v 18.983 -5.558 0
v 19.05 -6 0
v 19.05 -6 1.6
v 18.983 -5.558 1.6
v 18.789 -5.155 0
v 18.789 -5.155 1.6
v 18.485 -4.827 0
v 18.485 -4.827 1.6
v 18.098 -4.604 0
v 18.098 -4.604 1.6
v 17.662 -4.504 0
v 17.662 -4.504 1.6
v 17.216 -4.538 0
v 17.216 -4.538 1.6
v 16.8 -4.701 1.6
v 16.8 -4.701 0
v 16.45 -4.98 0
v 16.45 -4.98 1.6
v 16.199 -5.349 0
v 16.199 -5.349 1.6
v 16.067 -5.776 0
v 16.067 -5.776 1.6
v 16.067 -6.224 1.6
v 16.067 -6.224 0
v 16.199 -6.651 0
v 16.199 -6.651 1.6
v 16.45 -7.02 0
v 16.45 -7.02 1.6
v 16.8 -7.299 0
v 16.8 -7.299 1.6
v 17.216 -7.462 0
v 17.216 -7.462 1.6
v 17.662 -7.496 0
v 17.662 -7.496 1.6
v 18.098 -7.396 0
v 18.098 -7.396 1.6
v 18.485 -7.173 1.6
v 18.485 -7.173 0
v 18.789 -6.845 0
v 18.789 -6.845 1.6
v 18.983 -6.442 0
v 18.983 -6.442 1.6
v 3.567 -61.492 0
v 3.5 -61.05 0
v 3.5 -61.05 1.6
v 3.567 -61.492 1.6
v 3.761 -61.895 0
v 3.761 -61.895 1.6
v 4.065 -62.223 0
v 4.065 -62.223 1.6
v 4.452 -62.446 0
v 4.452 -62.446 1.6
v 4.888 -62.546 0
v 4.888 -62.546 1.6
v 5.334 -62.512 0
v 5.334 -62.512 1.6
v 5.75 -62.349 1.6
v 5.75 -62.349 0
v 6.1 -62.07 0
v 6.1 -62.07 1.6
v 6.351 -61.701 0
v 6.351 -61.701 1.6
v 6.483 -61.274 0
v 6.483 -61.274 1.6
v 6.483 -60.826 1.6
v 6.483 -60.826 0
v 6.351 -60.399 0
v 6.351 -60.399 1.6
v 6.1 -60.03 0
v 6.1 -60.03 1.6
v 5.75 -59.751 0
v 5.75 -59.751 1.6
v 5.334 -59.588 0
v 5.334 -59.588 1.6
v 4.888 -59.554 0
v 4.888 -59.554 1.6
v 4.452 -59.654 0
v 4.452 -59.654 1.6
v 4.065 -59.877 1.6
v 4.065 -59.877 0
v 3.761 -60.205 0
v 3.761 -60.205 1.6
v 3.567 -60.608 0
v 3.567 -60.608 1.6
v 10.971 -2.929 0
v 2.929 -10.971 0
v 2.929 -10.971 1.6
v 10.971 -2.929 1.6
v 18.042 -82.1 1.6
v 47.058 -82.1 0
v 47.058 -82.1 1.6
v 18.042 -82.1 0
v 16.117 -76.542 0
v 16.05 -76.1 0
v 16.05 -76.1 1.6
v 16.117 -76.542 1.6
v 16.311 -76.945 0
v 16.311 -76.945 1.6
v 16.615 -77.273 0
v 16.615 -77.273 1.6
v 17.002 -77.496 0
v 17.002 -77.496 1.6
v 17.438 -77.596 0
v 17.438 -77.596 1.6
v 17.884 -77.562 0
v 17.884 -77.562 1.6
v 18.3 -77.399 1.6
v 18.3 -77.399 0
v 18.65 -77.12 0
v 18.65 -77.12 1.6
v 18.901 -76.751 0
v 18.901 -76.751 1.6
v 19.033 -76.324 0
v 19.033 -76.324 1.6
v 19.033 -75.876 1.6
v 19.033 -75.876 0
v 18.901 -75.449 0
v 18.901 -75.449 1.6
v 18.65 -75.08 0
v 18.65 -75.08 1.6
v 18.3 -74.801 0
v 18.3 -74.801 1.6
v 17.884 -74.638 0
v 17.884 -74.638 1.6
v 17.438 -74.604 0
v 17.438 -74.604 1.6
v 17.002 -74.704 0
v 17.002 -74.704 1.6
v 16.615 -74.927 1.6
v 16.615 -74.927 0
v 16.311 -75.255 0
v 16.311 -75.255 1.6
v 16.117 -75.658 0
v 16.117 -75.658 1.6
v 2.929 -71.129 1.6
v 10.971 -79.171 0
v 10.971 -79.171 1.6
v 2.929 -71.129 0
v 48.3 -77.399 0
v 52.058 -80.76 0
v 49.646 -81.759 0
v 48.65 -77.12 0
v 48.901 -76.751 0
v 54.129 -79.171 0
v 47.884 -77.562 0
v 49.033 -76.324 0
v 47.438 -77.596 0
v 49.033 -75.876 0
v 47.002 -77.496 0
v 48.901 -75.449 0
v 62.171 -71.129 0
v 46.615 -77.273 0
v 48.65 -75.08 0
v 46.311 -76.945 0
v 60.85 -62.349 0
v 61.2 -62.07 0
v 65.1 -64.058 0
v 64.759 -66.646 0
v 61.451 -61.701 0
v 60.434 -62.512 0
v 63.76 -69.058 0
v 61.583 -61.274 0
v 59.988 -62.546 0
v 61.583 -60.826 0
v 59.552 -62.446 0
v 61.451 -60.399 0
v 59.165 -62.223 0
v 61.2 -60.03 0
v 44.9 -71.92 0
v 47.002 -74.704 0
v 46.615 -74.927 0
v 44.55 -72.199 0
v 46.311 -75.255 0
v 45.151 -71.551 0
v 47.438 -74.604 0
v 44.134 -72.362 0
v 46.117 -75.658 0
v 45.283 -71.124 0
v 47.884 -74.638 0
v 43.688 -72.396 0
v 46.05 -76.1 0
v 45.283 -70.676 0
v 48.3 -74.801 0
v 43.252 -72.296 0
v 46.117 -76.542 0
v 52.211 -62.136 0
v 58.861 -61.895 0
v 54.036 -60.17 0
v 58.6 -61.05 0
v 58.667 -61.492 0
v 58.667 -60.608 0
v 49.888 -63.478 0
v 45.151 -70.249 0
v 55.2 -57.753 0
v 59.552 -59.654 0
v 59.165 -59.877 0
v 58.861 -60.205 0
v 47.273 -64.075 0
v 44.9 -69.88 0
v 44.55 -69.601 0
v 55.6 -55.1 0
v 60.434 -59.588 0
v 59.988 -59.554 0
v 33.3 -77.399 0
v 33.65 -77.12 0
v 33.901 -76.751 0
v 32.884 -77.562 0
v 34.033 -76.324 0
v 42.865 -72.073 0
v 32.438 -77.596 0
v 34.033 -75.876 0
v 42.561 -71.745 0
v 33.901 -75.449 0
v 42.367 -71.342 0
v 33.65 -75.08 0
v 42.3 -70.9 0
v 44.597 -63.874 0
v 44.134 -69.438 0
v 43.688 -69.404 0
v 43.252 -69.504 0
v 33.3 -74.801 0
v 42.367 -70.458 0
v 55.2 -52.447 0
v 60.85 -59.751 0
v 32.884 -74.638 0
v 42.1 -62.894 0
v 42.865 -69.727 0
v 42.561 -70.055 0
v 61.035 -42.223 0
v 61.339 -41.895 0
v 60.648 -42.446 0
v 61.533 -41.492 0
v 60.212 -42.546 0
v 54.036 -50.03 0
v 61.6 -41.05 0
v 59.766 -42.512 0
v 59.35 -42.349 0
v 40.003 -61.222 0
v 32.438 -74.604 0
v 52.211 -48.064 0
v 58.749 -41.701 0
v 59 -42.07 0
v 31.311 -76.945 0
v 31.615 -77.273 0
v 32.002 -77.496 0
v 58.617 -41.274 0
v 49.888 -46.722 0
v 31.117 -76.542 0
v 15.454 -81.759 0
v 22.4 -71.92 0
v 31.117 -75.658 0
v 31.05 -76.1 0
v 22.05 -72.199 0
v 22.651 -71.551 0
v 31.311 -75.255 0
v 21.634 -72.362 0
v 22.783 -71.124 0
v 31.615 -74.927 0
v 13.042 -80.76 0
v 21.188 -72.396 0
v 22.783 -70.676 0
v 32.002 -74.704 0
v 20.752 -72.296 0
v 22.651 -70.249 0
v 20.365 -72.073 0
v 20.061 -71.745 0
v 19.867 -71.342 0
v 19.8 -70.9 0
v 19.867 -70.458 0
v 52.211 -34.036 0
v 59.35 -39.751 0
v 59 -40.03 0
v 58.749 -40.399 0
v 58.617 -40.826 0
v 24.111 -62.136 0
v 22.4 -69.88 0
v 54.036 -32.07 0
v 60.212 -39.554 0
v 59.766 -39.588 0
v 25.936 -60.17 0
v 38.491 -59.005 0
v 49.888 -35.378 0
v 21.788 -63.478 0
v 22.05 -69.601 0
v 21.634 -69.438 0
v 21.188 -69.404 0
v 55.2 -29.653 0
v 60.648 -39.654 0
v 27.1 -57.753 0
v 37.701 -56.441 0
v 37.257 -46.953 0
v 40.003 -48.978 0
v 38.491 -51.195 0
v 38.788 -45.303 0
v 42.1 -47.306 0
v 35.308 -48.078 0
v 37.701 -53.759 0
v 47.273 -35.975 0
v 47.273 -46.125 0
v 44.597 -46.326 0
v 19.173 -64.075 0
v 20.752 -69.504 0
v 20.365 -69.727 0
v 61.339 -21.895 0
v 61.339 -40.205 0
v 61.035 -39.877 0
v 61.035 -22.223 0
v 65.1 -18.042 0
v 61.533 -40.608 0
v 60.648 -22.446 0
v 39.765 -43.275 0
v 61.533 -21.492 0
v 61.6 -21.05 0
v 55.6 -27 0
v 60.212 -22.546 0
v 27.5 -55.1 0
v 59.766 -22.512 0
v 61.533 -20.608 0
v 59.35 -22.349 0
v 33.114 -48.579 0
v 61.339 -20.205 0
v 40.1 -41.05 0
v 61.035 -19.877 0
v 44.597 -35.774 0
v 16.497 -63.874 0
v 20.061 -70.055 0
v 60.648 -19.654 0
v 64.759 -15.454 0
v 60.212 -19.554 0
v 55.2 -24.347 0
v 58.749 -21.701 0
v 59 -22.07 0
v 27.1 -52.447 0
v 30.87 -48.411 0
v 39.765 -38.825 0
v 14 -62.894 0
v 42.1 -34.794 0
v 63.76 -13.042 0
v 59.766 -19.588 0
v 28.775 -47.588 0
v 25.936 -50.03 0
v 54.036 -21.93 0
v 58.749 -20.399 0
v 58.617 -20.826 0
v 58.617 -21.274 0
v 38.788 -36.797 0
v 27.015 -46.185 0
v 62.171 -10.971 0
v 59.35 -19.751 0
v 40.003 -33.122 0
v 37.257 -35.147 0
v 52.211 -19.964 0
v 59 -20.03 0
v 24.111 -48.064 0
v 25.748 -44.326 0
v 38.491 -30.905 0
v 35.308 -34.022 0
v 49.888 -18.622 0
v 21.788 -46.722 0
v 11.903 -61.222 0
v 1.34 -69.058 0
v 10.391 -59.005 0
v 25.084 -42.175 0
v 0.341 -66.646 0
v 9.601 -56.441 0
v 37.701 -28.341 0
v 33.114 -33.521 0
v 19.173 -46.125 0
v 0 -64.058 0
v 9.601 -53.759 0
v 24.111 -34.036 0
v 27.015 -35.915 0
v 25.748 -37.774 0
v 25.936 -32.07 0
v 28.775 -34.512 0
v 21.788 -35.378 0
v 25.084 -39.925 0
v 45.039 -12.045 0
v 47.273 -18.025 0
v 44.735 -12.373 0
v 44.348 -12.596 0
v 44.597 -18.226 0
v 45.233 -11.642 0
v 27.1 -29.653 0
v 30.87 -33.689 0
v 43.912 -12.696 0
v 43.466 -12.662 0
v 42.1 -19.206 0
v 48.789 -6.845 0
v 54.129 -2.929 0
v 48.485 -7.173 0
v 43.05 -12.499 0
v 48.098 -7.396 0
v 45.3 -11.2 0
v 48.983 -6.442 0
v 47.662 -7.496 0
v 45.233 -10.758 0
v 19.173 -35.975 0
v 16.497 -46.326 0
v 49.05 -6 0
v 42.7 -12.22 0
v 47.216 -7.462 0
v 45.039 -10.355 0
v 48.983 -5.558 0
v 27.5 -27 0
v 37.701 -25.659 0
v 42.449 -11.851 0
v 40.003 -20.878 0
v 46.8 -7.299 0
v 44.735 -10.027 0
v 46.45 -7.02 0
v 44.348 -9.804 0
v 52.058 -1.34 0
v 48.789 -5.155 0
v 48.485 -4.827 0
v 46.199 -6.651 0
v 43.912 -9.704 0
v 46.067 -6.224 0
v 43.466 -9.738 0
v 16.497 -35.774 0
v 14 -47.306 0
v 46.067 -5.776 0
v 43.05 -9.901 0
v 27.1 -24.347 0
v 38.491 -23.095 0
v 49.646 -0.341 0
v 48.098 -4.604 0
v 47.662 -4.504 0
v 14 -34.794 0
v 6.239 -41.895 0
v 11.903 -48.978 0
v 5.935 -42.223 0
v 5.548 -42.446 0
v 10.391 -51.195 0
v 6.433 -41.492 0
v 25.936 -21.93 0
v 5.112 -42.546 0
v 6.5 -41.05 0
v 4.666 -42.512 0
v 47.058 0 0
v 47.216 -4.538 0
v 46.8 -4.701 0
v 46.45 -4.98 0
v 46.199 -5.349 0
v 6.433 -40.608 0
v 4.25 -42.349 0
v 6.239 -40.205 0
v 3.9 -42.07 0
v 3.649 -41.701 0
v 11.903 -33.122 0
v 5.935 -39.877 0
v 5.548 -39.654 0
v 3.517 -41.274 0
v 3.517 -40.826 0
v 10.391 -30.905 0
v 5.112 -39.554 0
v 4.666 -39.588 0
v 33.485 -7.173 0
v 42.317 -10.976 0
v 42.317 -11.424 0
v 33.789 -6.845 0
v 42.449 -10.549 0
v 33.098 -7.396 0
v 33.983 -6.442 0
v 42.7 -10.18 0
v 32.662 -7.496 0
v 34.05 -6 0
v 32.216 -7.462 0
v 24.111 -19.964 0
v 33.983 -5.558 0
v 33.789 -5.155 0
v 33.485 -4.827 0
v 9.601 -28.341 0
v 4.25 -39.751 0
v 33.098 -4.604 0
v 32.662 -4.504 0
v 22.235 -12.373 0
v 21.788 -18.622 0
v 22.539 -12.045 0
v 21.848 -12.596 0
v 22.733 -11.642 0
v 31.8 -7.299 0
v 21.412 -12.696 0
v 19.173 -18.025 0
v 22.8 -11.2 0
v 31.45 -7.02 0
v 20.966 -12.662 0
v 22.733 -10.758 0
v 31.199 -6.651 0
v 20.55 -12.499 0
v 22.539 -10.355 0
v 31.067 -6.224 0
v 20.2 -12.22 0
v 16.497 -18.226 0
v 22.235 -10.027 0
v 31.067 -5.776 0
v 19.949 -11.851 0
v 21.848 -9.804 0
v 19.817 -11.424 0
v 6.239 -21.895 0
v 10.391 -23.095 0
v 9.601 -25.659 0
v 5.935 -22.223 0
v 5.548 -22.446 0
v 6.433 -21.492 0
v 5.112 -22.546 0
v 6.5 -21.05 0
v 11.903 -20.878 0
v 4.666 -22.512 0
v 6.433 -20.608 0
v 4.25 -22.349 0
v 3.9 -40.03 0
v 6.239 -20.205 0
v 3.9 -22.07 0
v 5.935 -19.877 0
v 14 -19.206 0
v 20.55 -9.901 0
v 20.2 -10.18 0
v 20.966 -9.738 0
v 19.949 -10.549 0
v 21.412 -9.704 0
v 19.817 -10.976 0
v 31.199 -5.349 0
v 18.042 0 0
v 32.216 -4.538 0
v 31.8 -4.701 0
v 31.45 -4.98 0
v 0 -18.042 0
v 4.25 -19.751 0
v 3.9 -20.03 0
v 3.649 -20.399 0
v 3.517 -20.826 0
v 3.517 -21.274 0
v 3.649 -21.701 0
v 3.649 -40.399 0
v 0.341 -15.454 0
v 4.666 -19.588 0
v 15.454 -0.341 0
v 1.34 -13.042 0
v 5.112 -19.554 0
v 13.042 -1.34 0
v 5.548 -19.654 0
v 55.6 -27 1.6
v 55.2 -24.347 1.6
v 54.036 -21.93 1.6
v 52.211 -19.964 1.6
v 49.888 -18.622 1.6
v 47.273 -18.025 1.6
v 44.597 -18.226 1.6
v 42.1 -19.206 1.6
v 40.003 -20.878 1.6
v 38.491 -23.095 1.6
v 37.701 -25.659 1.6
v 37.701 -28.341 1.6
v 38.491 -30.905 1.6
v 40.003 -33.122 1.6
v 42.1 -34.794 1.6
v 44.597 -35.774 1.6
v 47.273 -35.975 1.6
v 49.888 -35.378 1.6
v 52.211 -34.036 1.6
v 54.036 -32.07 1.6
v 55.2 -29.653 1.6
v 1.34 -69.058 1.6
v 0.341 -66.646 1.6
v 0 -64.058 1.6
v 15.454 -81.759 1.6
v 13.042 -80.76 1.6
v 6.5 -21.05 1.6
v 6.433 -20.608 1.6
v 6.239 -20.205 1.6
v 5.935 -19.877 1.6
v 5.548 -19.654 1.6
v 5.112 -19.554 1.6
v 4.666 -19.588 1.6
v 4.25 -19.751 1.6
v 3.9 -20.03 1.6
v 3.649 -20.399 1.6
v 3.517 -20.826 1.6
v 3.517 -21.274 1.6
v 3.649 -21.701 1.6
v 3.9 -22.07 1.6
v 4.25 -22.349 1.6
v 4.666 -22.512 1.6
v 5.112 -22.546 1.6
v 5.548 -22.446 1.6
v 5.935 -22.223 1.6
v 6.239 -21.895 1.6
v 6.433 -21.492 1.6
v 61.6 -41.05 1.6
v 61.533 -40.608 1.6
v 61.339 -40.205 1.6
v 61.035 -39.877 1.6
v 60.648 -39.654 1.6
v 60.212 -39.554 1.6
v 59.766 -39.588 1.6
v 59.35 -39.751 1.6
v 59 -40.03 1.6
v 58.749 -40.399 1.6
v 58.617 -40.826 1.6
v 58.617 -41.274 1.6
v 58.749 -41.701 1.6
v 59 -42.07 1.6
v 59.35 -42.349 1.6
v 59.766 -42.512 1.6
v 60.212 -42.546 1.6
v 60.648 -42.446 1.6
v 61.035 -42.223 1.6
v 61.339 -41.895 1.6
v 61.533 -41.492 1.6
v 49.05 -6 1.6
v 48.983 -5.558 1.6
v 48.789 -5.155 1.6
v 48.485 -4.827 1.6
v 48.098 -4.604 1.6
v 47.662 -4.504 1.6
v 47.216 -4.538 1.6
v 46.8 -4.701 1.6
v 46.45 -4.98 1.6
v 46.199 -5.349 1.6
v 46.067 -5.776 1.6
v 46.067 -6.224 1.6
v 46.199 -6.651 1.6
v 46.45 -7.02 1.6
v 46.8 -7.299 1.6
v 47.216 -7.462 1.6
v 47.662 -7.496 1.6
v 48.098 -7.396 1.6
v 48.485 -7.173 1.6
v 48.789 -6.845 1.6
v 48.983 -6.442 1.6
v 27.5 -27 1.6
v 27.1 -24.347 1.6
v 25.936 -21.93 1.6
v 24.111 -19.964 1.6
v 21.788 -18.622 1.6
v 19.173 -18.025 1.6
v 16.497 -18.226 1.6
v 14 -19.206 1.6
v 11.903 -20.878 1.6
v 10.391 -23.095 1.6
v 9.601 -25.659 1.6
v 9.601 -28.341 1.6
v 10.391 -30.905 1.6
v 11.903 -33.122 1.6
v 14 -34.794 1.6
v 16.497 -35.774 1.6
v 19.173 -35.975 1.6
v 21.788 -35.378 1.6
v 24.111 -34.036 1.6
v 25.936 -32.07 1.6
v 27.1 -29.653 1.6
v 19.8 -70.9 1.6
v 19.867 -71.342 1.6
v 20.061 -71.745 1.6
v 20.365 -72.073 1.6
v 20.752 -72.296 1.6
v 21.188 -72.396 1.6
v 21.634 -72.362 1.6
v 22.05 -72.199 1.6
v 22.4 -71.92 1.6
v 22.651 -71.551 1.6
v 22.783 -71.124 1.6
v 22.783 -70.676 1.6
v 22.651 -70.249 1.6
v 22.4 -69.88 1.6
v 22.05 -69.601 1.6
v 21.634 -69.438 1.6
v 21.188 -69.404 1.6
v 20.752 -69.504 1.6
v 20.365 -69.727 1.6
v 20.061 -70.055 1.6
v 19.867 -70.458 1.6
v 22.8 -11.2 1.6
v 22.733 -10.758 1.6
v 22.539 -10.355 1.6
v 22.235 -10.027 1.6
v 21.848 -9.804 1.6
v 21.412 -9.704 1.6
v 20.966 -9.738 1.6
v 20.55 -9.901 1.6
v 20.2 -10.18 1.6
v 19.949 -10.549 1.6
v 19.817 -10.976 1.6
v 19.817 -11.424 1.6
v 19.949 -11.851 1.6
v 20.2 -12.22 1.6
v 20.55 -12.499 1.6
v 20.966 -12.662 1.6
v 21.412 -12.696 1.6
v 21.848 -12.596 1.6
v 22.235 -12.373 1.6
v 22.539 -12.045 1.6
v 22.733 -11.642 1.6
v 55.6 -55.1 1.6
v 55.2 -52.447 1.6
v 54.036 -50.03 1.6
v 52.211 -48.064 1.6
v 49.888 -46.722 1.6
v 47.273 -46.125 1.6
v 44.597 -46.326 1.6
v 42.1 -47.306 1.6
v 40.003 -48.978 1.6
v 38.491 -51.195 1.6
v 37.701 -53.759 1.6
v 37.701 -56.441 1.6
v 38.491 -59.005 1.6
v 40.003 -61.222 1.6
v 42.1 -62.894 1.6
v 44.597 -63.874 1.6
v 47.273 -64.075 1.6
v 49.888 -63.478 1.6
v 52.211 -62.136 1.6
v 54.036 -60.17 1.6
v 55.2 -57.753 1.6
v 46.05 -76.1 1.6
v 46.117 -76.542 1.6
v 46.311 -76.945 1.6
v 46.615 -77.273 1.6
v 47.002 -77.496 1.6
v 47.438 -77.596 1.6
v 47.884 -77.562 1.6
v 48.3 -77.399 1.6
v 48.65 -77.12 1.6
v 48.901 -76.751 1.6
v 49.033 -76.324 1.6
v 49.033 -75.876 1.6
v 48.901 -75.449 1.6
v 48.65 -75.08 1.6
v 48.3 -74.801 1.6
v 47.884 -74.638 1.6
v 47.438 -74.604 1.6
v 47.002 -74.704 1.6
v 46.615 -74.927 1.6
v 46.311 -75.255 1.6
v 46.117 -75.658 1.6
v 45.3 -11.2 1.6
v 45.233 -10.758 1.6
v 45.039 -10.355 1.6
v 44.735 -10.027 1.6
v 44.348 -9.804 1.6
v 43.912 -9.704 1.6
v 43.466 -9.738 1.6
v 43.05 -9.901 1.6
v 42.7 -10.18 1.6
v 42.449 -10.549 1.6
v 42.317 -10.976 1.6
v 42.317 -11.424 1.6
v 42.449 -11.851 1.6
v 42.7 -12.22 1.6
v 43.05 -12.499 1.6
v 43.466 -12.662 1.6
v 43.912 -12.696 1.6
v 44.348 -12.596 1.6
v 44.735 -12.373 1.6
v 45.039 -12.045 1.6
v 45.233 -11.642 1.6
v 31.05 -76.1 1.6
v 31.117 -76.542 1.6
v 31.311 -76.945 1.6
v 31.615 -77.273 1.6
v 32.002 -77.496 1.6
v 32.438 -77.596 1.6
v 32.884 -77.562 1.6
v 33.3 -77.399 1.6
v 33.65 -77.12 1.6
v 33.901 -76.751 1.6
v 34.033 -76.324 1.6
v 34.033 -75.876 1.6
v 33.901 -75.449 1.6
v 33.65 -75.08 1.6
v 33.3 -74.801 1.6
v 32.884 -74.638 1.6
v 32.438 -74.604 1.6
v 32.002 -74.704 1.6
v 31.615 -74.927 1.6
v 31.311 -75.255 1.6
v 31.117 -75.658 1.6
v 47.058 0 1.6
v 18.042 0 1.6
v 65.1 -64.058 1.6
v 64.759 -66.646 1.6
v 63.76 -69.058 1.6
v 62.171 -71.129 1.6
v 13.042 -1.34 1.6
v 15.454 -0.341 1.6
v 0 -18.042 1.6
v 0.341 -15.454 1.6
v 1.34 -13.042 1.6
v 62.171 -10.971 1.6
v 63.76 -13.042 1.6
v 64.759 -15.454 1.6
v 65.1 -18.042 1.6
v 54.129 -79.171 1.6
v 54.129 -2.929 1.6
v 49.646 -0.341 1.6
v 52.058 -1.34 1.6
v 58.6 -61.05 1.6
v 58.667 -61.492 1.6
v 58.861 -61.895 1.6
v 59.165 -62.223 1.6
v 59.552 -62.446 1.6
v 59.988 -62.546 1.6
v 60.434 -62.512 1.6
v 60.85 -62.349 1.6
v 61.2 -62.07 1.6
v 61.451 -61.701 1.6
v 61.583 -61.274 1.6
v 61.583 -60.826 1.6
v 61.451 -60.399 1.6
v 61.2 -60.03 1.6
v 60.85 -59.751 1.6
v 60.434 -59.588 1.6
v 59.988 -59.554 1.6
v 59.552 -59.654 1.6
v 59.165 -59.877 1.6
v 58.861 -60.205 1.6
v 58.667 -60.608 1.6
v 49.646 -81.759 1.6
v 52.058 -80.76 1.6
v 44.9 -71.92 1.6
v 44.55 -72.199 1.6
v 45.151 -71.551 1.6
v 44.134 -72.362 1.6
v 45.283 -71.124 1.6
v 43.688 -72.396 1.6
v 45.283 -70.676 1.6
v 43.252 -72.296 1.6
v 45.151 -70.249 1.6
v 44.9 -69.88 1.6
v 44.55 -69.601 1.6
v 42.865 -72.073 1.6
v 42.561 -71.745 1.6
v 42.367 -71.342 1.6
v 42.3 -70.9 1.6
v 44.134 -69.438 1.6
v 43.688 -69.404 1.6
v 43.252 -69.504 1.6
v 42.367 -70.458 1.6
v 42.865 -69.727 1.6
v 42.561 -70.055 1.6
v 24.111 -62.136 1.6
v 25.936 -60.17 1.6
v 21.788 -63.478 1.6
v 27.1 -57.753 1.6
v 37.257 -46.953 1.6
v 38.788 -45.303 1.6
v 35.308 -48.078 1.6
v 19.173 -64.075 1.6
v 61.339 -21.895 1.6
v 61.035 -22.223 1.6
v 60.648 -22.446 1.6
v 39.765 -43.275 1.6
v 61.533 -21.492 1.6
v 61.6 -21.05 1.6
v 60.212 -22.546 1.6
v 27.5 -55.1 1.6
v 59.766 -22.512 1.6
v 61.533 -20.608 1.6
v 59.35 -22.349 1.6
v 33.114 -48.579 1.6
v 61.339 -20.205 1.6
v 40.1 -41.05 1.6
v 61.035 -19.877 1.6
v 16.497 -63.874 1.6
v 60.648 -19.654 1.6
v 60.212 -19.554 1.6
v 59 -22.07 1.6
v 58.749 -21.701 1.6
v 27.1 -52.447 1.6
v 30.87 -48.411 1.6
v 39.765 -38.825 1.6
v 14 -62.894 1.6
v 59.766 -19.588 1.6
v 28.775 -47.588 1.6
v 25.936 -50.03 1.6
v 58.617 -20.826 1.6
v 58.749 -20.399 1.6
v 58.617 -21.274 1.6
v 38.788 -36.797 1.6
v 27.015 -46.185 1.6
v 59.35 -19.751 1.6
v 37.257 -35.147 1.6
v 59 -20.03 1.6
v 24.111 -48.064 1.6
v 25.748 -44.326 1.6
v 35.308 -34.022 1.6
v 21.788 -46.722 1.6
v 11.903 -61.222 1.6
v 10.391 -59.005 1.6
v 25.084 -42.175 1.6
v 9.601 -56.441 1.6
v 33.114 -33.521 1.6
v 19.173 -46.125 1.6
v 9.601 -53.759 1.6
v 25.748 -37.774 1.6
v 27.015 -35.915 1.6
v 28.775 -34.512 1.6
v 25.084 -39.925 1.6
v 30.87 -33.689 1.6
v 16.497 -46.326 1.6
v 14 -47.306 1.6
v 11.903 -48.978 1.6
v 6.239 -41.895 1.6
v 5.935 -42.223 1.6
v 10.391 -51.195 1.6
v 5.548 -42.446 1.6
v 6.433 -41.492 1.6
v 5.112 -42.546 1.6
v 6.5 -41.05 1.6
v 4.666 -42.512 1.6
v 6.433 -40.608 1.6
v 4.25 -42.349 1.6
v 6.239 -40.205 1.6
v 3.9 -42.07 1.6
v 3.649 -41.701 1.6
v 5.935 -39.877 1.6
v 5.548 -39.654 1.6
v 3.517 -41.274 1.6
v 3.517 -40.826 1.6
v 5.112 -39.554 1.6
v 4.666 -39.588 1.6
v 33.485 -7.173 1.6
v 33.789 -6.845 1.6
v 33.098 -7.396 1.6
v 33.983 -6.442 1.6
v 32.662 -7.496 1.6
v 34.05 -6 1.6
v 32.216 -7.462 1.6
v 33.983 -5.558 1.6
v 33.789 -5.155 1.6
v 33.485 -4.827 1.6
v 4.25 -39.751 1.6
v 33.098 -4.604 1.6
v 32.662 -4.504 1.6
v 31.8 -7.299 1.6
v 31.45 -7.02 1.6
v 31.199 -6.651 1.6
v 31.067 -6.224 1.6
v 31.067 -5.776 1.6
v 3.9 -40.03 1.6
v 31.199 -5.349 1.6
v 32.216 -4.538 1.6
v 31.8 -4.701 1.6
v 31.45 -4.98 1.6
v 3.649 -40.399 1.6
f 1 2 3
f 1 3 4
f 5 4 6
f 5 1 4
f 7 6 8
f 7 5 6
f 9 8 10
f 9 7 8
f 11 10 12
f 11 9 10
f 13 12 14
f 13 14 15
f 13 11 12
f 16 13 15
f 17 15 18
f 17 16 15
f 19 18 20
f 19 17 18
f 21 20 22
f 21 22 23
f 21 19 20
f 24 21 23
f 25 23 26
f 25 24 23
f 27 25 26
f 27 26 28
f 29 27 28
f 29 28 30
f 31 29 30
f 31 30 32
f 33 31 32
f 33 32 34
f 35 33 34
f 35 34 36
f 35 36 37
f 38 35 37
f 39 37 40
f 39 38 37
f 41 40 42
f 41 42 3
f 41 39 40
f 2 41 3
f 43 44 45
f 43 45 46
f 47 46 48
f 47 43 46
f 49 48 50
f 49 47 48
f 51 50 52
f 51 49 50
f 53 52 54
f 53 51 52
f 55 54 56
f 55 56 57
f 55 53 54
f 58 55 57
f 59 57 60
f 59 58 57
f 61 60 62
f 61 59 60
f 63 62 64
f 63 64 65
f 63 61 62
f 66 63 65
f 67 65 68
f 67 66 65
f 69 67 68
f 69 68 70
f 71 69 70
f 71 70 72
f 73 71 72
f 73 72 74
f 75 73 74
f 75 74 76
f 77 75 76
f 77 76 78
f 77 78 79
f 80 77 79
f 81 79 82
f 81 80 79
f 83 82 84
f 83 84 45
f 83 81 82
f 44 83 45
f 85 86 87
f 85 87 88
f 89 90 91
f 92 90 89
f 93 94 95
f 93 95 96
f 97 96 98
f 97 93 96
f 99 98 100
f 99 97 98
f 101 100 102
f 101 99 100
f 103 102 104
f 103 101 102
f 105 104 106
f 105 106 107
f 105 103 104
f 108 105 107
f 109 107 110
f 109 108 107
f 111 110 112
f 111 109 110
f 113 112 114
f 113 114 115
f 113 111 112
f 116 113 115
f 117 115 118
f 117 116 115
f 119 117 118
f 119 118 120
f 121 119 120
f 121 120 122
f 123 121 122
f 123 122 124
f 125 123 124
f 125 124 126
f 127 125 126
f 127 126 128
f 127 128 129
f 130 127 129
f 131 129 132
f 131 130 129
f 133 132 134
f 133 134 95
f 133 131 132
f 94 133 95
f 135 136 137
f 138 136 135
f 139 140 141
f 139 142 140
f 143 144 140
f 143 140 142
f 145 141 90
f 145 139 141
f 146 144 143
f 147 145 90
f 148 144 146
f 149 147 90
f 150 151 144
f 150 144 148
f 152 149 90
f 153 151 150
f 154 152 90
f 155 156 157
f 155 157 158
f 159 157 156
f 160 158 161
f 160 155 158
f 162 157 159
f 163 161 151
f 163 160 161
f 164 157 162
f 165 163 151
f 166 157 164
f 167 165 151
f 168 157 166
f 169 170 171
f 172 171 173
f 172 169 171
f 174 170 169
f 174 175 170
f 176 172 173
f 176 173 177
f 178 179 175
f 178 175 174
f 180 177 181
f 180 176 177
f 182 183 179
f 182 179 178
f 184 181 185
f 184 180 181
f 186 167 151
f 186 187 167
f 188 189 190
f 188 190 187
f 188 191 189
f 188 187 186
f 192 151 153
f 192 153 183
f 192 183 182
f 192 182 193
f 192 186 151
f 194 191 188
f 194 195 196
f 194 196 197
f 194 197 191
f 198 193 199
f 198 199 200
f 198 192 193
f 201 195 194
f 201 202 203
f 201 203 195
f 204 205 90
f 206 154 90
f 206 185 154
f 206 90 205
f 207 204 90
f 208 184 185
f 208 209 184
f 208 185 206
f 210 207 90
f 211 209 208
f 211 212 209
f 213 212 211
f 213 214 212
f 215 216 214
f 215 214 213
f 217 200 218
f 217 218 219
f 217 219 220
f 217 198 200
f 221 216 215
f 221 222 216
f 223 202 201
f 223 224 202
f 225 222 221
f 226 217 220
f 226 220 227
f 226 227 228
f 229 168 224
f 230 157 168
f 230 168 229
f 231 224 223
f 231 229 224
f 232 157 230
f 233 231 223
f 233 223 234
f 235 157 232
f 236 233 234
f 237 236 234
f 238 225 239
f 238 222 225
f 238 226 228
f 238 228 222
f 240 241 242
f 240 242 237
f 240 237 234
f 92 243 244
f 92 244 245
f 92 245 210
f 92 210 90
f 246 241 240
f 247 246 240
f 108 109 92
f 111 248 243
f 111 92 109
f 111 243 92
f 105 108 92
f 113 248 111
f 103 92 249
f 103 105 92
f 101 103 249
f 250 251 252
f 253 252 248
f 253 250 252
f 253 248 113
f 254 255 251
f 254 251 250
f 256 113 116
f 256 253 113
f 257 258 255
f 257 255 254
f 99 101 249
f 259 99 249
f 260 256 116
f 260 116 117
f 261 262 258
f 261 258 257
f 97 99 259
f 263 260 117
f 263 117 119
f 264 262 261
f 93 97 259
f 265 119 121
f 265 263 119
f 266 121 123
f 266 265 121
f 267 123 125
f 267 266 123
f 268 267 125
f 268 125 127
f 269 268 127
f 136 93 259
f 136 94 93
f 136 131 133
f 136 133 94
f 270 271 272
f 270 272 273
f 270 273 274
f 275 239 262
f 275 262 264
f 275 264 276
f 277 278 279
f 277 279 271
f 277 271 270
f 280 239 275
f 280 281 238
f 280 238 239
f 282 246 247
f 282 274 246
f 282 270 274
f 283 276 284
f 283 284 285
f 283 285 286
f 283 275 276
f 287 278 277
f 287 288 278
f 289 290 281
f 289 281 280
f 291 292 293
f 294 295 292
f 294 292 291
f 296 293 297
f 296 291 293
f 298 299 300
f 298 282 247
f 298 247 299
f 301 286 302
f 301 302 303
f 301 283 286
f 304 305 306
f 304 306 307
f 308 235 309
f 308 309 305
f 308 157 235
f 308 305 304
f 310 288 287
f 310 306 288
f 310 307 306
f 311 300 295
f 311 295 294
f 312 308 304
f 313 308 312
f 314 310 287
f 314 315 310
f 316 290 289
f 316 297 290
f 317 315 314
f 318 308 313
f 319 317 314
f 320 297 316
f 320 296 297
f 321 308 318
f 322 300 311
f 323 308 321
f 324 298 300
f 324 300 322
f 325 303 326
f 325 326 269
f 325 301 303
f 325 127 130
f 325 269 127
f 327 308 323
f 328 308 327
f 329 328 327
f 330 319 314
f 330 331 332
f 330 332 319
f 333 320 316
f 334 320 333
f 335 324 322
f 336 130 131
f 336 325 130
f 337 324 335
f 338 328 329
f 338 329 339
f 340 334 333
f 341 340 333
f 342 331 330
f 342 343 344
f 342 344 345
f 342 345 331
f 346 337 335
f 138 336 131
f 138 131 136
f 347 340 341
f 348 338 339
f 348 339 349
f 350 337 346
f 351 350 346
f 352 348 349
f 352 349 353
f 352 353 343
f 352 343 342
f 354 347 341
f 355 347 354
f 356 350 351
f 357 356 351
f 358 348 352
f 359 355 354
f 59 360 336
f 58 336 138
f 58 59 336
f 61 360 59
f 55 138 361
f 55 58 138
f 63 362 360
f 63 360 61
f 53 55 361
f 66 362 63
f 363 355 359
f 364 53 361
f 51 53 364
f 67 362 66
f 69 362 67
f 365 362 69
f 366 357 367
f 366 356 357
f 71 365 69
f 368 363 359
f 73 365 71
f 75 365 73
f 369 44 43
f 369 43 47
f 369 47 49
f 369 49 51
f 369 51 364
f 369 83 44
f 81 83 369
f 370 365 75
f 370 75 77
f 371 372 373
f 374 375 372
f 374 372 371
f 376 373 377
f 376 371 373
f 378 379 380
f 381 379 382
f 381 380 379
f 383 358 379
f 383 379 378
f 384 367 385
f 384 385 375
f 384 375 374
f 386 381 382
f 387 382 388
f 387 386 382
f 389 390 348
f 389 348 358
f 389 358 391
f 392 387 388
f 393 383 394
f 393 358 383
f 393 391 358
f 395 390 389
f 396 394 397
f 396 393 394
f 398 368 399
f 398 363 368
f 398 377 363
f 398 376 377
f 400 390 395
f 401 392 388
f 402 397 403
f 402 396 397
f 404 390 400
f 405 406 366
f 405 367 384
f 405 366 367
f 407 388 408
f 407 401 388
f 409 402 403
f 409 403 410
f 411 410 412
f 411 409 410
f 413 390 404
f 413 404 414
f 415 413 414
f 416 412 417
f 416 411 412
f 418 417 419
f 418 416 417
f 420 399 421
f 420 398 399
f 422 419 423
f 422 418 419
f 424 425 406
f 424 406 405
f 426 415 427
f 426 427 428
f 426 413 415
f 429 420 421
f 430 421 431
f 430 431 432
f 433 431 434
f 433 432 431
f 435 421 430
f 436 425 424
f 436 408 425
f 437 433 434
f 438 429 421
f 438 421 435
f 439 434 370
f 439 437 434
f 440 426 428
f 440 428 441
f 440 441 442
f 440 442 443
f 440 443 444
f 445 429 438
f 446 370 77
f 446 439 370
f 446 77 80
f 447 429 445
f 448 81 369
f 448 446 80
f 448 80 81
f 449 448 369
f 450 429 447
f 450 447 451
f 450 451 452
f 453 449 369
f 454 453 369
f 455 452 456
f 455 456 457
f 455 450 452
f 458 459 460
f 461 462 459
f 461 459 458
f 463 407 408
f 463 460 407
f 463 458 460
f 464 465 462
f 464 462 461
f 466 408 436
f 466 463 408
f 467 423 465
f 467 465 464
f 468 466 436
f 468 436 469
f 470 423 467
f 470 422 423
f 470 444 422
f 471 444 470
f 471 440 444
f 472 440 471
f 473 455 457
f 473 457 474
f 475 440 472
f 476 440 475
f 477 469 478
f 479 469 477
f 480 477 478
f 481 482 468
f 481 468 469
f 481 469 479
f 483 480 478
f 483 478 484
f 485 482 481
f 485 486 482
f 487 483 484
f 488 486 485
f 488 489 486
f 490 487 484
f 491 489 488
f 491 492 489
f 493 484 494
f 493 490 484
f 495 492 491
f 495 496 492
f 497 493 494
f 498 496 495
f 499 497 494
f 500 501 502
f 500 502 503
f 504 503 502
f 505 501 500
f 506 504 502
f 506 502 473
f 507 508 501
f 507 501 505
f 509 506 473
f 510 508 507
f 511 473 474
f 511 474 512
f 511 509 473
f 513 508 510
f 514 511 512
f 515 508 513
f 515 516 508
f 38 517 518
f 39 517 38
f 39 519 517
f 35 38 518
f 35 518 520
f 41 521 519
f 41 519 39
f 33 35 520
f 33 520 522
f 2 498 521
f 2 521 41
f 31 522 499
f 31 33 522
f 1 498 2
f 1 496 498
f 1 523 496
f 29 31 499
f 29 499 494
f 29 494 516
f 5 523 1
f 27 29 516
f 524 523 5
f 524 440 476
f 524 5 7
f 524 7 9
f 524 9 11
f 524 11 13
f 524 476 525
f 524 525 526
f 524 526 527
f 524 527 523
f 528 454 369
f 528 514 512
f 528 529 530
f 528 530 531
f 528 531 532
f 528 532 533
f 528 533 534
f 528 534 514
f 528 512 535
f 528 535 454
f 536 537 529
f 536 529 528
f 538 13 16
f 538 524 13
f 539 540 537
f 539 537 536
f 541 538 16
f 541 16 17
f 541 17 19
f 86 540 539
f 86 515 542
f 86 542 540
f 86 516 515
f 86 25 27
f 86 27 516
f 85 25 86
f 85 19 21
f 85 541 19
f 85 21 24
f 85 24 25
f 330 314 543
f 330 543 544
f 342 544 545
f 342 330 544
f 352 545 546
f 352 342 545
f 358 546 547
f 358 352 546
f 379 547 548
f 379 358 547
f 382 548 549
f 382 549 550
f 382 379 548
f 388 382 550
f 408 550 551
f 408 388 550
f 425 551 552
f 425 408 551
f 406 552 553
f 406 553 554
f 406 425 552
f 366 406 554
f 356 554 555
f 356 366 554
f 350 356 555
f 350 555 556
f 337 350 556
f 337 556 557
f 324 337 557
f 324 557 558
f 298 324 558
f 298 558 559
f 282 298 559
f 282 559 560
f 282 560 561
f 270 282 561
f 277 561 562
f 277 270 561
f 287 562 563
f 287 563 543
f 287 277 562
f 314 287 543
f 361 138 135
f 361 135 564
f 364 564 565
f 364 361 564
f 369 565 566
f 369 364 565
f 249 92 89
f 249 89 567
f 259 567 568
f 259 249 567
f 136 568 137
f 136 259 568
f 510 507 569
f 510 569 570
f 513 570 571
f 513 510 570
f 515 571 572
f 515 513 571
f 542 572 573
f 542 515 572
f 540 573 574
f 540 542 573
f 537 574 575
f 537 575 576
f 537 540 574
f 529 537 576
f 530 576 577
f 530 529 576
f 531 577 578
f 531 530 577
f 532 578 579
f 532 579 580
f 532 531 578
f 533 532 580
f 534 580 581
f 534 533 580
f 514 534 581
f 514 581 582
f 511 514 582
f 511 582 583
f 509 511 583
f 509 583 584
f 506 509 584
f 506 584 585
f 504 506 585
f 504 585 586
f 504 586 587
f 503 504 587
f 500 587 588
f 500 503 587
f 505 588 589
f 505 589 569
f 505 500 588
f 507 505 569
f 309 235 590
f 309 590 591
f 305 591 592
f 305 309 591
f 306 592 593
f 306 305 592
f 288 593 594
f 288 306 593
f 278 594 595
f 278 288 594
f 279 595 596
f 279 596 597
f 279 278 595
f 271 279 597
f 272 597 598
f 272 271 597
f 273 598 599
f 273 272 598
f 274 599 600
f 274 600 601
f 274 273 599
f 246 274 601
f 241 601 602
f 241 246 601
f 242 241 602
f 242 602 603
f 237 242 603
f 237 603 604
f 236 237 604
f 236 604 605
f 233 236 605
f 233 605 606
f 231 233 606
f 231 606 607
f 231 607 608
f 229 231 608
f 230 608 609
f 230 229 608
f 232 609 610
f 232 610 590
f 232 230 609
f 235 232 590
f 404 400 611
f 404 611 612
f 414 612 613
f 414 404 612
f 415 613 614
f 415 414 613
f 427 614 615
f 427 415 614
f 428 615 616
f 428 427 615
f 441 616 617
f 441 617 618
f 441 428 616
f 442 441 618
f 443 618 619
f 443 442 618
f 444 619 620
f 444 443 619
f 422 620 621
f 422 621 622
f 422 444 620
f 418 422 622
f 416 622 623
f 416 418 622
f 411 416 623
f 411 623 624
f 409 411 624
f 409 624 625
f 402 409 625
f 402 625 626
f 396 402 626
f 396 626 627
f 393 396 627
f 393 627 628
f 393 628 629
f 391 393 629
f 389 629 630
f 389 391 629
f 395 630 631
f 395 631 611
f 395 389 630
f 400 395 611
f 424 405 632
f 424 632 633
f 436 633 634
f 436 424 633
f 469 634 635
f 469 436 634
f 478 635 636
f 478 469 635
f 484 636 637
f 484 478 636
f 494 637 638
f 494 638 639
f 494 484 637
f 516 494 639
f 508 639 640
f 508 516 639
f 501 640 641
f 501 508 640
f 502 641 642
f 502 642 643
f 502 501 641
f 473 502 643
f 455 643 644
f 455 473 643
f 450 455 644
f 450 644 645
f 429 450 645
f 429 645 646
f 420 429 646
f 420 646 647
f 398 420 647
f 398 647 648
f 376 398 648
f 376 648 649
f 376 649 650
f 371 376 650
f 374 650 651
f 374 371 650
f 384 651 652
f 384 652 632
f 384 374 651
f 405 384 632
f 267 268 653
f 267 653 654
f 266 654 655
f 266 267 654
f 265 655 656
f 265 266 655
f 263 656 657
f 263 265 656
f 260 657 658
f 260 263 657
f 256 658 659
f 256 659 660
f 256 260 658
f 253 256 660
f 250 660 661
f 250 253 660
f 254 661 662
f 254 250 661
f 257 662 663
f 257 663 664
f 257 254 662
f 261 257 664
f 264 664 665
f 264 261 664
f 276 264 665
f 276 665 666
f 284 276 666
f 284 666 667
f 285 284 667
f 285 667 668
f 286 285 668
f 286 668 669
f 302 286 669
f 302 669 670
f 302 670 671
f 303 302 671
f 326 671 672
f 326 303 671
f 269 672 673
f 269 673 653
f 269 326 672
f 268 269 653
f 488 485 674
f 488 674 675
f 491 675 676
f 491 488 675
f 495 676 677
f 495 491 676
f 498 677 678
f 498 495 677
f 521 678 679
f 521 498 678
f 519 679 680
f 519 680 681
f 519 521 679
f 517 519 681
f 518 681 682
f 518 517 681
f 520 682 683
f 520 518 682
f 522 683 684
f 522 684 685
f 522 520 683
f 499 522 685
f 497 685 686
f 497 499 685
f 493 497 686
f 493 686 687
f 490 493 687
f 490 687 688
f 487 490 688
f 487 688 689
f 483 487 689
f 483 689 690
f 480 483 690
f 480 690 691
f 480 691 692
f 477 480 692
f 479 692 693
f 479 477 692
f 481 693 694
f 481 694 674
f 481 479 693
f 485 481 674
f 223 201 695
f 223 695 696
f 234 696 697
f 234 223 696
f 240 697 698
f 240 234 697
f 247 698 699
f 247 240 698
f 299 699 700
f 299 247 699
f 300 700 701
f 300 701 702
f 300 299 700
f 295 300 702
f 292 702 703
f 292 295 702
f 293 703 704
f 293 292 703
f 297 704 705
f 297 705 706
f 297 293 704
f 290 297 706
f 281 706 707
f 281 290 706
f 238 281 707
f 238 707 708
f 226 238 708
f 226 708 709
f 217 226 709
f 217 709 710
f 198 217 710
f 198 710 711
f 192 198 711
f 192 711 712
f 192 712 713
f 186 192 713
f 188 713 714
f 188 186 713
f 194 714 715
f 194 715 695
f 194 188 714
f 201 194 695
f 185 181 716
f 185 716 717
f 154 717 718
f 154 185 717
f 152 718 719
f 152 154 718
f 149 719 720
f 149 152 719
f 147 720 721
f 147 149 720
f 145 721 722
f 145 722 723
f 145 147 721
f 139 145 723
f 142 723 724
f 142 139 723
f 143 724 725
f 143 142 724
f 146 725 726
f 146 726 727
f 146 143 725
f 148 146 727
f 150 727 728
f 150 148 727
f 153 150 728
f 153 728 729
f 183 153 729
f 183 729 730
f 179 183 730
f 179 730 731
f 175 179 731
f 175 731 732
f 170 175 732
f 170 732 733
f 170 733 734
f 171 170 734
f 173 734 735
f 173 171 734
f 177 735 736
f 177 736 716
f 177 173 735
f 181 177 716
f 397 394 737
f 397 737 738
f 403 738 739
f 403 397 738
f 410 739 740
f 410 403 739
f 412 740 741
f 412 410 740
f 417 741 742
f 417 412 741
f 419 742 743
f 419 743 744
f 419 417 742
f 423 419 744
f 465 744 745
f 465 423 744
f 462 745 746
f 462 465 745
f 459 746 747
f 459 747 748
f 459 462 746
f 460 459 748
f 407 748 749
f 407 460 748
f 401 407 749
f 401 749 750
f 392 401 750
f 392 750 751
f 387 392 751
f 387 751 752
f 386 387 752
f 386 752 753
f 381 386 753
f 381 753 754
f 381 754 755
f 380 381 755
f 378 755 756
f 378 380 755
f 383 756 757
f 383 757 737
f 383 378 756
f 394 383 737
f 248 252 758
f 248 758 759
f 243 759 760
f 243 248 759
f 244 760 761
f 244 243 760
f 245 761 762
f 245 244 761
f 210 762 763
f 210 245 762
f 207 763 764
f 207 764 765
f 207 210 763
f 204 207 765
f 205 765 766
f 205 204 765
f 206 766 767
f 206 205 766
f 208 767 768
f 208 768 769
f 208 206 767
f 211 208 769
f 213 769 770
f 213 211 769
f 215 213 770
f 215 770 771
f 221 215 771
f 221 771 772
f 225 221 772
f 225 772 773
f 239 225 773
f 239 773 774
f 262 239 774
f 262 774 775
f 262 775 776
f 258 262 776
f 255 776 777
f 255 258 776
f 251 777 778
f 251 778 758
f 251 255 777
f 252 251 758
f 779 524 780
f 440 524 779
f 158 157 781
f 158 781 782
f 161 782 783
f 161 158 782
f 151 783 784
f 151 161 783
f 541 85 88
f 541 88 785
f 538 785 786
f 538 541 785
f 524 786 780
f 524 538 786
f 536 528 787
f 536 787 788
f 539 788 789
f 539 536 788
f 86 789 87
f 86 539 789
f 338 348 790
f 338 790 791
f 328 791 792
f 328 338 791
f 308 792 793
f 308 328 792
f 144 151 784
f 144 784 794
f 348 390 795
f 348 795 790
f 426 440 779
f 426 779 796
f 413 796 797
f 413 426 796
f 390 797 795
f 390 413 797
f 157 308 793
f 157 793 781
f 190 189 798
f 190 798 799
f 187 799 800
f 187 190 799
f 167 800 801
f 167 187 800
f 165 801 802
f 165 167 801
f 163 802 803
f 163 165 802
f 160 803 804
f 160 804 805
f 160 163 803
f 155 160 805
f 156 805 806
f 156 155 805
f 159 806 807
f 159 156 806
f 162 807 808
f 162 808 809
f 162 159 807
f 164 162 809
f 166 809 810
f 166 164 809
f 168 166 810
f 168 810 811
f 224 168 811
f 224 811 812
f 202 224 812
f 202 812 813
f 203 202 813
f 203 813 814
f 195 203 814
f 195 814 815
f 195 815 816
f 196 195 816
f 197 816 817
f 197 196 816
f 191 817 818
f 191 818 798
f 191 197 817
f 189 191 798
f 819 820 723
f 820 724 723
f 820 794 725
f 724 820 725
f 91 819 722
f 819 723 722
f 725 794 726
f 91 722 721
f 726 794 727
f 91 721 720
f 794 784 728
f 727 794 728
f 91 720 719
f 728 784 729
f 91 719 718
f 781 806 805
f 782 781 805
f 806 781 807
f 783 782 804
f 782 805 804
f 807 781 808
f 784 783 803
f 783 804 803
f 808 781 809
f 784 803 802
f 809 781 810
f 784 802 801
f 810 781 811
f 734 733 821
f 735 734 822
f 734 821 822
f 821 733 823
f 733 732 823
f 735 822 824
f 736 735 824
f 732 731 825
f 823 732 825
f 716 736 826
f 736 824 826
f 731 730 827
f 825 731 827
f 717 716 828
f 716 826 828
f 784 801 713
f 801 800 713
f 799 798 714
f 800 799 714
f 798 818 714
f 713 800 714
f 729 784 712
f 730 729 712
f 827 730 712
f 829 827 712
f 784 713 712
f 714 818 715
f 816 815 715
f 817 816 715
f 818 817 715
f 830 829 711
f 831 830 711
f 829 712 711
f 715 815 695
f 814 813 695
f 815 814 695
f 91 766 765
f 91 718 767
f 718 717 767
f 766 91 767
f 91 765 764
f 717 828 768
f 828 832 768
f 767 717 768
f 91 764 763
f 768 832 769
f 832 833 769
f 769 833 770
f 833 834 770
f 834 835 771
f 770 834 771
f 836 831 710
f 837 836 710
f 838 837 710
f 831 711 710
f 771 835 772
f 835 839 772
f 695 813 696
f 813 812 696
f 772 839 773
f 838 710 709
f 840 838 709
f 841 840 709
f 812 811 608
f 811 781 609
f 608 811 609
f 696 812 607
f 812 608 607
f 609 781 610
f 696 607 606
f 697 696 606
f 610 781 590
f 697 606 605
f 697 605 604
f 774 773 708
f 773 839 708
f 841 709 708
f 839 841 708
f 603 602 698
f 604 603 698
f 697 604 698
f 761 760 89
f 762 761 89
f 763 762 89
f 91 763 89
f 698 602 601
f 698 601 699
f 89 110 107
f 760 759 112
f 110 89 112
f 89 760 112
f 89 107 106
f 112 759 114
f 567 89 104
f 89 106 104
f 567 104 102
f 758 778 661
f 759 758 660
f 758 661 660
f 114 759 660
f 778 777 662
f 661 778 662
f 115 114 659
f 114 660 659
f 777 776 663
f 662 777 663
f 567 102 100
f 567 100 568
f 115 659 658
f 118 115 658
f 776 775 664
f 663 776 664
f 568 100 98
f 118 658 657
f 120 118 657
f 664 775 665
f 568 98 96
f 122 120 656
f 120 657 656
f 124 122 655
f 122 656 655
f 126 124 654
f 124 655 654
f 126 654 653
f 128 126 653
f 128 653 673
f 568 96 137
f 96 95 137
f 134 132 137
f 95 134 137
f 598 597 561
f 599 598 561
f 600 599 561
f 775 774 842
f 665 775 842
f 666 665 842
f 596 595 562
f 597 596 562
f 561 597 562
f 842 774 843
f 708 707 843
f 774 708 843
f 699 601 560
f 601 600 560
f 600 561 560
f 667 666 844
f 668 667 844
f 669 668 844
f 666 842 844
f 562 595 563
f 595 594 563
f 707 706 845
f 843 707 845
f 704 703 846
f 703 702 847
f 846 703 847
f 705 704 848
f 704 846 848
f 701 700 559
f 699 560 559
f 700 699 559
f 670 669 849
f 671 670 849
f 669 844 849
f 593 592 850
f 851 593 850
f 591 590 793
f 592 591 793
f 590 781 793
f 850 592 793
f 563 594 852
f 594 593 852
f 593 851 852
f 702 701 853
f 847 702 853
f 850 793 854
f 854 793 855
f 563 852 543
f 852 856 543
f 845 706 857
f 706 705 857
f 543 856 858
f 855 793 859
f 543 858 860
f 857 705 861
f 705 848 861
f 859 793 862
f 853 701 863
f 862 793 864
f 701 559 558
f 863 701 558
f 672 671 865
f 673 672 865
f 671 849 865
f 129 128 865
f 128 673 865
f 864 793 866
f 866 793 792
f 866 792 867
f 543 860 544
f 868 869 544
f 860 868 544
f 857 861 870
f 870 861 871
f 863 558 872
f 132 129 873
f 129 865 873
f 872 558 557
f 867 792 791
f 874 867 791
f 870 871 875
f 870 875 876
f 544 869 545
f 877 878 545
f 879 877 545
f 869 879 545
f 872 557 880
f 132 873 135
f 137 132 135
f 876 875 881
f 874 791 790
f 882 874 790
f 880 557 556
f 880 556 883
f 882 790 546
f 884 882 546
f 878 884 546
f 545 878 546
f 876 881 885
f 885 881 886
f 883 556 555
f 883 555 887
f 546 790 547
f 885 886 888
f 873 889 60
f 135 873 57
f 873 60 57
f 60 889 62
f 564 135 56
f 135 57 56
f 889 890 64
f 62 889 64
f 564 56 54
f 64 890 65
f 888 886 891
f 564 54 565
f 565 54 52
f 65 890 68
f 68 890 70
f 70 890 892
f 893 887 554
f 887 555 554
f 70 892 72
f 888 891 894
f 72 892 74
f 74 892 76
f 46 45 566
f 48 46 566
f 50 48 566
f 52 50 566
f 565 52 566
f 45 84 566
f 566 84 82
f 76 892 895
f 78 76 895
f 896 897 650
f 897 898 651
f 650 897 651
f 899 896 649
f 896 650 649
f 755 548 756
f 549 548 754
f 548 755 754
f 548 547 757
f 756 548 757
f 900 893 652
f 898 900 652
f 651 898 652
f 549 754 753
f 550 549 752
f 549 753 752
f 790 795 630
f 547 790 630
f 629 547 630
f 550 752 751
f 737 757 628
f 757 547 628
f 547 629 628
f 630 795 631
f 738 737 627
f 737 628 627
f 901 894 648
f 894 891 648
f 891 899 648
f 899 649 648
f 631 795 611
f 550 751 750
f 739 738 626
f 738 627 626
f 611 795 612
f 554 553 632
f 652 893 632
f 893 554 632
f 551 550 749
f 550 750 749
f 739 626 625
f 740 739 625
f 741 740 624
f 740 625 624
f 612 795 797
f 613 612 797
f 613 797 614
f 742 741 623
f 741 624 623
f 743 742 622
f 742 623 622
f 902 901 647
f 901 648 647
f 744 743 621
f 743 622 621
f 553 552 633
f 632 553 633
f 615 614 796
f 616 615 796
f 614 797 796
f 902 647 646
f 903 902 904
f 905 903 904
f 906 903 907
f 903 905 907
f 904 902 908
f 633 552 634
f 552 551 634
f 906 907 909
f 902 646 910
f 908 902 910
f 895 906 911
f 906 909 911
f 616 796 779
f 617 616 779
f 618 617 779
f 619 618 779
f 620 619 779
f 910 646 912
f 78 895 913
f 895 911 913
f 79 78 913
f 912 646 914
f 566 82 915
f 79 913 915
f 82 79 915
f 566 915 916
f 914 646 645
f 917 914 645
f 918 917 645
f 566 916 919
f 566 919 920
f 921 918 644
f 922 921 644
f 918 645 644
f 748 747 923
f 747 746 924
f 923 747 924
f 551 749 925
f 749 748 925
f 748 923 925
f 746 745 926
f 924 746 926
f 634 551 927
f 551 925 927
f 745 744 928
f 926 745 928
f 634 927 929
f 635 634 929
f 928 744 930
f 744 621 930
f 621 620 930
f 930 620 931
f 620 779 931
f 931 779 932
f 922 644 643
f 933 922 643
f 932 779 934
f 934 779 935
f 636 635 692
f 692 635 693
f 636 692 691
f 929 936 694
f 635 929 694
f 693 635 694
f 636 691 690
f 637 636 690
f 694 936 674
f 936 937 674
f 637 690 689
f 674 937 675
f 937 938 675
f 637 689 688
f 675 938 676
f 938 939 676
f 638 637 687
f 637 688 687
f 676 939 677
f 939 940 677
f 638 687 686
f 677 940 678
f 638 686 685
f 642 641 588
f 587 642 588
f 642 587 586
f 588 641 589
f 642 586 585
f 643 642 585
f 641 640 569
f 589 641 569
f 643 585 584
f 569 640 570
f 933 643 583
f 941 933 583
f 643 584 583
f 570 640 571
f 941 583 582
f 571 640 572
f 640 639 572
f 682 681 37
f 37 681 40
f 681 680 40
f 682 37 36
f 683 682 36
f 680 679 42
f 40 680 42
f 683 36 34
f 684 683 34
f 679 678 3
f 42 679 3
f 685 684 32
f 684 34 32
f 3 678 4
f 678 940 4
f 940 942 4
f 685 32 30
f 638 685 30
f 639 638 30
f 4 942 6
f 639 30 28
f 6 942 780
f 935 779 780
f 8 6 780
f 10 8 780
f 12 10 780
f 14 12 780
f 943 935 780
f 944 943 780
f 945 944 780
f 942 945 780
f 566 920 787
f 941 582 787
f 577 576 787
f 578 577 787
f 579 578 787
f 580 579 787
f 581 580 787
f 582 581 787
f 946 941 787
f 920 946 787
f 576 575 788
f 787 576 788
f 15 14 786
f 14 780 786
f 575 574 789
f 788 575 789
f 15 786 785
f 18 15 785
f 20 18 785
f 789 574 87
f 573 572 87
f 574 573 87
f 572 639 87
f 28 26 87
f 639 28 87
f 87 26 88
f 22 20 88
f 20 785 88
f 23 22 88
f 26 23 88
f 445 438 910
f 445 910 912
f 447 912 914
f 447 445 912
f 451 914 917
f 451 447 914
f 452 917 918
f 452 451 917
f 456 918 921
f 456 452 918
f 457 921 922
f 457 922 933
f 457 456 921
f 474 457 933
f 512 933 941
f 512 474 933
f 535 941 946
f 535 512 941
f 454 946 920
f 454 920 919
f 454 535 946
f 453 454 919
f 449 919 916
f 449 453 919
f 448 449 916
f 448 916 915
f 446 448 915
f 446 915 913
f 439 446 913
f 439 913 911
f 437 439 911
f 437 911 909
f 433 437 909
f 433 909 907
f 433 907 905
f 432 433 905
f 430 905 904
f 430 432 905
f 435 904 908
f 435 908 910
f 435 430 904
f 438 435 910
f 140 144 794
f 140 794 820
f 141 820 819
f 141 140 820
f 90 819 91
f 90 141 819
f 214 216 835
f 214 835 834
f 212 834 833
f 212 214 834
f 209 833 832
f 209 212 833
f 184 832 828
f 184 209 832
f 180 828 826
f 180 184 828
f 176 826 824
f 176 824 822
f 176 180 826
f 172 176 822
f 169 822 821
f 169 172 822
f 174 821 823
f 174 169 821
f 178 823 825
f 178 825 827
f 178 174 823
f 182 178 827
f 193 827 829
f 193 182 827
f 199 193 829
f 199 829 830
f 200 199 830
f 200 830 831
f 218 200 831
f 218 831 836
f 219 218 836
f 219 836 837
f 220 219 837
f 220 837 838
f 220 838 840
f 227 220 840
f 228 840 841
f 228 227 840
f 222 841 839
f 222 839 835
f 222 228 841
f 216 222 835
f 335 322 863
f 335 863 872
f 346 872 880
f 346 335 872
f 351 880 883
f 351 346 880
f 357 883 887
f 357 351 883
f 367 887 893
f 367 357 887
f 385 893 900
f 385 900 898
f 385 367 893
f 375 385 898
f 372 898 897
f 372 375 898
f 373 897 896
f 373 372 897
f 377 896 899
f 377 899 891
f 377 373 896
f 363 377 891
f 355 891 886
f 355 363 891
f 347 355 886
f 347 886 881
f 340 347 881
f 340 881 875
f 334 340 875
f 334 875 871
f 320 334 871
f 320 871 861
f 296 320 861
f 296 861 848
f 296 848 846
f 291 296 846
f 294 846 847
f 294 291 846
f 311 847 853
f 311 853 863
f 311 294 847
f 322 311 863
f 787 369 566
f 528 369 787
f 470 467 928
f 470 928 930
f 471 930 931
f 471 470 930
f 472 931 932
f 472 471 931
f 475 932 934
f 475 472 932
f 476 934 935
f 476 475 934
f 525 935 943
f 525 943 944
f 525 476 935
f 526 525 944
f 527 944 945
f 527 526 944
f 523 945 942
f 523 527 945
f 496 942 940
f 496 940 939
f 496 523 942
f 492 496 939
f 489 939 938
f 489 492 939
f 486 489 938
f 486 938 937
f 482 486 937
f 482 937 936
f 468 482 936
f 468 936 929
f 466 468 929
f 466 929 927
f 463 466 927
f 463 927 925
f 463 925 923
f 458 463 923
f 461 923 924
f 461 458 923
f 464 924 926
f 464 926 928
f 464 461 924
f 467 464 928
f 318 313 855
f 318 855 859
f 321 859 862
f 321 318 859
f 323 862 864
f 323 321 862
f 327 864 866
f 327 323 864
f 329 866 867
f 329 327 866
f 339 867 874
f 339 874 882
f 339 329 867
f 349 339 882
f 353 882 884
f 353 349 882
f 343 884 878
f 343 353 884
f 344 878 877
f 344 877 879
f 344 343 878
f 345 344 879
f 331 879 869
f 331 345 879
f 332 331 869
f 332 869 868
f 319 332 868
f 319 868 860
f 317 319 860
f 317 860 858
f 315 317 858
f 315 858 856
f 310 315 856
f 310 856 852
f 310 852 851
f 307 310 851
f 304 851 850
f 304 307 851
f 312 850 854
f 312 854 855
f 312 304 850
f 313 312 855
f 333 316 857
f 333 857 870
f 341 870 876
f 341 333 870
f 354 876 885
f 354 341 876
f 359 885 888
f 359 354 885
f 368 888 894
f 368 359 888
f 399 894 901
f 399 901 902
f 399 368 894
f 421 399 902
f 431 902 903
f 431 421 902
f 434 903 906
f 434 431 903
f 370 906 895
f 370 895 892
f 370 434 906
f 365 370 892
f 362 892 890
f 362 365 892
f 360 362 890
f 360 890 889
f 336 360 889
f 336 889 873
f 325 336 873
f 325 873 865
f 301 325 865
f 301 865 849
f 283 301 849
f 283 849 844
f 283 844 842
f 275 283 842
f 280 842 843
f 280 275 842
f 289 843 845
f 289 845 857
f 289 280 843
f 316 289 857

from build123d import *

# Parameters (mm, degrees)
IZIM1_R                     = 9
IZIM1_R_2                   = 7.55
IZIM1_R_3                   = 1.5
Y_KSEKLIK_EKSTR_ZYON1_DEPTH = 1.6


with BuildPart() as part:
    # Çizim1 → Yükseklik-Ekstrüzyon1 (new body)
    with BuildSketch(Plane.XY):
        with BuildLine():
            Line((2.928932188, -10.971067812), (10.971067812, -2.928932188))
            ThreePointArc((10.971067812, -2.928932188), (14.2153013, -0.761204675), (18.042135624, 0))
            Line((18.042135624, 0), (47.057864376, 0))
            ThreePointArc((47.057864376, 0), (50.8846987, -0.761204675), (54.128932188, -2.928932188))
            Line((54.128932188, -2.928932188), (62.171067812, -10.971067812))
            ThreePointArc((62.171067812, -10.971067812), (64.338795325, -14.2153013), (65.1, -18.042135624))
            Line((65.1, -18.042135624), (65.1, -64.057864376))
            ThreePointArc((65.1, -64.057864376), (64.338795325, -67.8846987), (62.171067812, -71.128932188))
            Line((62.171067812, -71.128932188), (54.128932188, -79.171067812))
            ThreePointArc((54.128932188, -79.171067812), (50.8846987, -81.338795325), (47.057864376, -82.1))
            Line((47.057864376, -82.1), (18.042135624, -82.1))
            ThreePointArc((18.042135624, -82.1), (14.2153013, -81.338795325), (10.971067812, -79.171067812))
            Line((10.971067812, -79.171067812), (2.928932188, -71.128932188))
            ThreePointArc((2.928932188, -71.128932188), (0.761204675, -67.8846987), (0, -64.057864376))
            Line((0, -64.057864376), (0, -18.042135624))
            ThreePointArc((0, -18.042135624), (0.761204675, -14.2153013), (2.928932188, -10.971067812))
        make_face()
        with Locations((18.5, -27)):
            Circle(IZIM1_R, mode=Mode.SUBTRACT)
        with Locations((46.6, -27)):
            Circle(IZIM1_R, mode=Mode.SUBTRACT)
        with Locations((18.5, -55.1)):
            Circle(IZIM1_R, mode=Mode.SUBTRACT)
        with Locations((46.6, -55.1)):
            Circle(IZIM1_R, mode=Mode.SUBTRACT)
        with Locations((32.55, -41.05)):
            Circle(IZIM1_R_2, mode=Mode.SUBTRACT)
        with Locations((32.55, -6)):
            Circle(IZIM1_R_3, mode=Mode.SUBTRACT)
        with Locations((47.55, -6)):
            Circle(IZIM1_R_3, mode=Mode.SUBTRACT)
        with Locations((43.8, -11.2)):
            Circle(IZIM1_R_3, mode=Mode.SUBTRACT)
        with Locations((17.55, -6)):
            Circle(IZIM1_R_3, mode=Mode.SUBTRACT)
        with Locations((21.3, -11.2)):
            Circle(IZIM1_R_3, mode=Mode.SUBTRACT)
        with Locations((5, -21.05)):
            Circle(IZIM1_R_3, mode=Mode.SUBTRACT)
        with Locations((60.1, -21.05)):
            Circle(IZIM1_R_3, mode=Mode.SUBTRACT)
        with Locations((5, -41.05)):
            Circle(IZIM1_R_3, mode=Mode.SUBTRACT)
        with Locations((60.1, -41.05)):
            Circle(IZIM1_R_3, mode=Mode.SUBTRACT)
        with Locations(Location((60.1, -61.05, 0), (0, 0, 180))):
            Circle(IZIM1_R_3, mode=Mode.SUBTRACT)
        with Locations(Location((32.55, -76.1, 0), (0, 0, 180))):
            Circle(IZIM1_R_3, mode=Mode.SUBTRACT)
        with Locations(Location((47.55, -76.1, 0), (0, 0, 180))):
            Circle(IZIM1_R_3, mode=Mode.SUBTRACT)
        with Locations(Location((43.8, -70.9, 0), (0, 0, 180))):
            Circle(IZIM1_R_3, mode=Mode.SUBTRACT)
        with Locations(Location((21.3, -70.9, 0), (0, 0, 180))):
            Circle(IZIM1_R_3, mode=Mode.SUBTRACT)
        with Locations(Location((17.55, -76.1, 0), (0, 0, 180))):
            Circle(IZIM1_R_3, mode=Mode.SUBTRACT)
        with Locations(Location((5, -61.05, 0), (0, 0, 180))):
            Circle(IZIM1_R_3, mode=Mode.SUBTRACT)
    extrude(amount=Y_KSEKLIK_EKSTR_ZYON1_DEPTH)


solid = part.part
